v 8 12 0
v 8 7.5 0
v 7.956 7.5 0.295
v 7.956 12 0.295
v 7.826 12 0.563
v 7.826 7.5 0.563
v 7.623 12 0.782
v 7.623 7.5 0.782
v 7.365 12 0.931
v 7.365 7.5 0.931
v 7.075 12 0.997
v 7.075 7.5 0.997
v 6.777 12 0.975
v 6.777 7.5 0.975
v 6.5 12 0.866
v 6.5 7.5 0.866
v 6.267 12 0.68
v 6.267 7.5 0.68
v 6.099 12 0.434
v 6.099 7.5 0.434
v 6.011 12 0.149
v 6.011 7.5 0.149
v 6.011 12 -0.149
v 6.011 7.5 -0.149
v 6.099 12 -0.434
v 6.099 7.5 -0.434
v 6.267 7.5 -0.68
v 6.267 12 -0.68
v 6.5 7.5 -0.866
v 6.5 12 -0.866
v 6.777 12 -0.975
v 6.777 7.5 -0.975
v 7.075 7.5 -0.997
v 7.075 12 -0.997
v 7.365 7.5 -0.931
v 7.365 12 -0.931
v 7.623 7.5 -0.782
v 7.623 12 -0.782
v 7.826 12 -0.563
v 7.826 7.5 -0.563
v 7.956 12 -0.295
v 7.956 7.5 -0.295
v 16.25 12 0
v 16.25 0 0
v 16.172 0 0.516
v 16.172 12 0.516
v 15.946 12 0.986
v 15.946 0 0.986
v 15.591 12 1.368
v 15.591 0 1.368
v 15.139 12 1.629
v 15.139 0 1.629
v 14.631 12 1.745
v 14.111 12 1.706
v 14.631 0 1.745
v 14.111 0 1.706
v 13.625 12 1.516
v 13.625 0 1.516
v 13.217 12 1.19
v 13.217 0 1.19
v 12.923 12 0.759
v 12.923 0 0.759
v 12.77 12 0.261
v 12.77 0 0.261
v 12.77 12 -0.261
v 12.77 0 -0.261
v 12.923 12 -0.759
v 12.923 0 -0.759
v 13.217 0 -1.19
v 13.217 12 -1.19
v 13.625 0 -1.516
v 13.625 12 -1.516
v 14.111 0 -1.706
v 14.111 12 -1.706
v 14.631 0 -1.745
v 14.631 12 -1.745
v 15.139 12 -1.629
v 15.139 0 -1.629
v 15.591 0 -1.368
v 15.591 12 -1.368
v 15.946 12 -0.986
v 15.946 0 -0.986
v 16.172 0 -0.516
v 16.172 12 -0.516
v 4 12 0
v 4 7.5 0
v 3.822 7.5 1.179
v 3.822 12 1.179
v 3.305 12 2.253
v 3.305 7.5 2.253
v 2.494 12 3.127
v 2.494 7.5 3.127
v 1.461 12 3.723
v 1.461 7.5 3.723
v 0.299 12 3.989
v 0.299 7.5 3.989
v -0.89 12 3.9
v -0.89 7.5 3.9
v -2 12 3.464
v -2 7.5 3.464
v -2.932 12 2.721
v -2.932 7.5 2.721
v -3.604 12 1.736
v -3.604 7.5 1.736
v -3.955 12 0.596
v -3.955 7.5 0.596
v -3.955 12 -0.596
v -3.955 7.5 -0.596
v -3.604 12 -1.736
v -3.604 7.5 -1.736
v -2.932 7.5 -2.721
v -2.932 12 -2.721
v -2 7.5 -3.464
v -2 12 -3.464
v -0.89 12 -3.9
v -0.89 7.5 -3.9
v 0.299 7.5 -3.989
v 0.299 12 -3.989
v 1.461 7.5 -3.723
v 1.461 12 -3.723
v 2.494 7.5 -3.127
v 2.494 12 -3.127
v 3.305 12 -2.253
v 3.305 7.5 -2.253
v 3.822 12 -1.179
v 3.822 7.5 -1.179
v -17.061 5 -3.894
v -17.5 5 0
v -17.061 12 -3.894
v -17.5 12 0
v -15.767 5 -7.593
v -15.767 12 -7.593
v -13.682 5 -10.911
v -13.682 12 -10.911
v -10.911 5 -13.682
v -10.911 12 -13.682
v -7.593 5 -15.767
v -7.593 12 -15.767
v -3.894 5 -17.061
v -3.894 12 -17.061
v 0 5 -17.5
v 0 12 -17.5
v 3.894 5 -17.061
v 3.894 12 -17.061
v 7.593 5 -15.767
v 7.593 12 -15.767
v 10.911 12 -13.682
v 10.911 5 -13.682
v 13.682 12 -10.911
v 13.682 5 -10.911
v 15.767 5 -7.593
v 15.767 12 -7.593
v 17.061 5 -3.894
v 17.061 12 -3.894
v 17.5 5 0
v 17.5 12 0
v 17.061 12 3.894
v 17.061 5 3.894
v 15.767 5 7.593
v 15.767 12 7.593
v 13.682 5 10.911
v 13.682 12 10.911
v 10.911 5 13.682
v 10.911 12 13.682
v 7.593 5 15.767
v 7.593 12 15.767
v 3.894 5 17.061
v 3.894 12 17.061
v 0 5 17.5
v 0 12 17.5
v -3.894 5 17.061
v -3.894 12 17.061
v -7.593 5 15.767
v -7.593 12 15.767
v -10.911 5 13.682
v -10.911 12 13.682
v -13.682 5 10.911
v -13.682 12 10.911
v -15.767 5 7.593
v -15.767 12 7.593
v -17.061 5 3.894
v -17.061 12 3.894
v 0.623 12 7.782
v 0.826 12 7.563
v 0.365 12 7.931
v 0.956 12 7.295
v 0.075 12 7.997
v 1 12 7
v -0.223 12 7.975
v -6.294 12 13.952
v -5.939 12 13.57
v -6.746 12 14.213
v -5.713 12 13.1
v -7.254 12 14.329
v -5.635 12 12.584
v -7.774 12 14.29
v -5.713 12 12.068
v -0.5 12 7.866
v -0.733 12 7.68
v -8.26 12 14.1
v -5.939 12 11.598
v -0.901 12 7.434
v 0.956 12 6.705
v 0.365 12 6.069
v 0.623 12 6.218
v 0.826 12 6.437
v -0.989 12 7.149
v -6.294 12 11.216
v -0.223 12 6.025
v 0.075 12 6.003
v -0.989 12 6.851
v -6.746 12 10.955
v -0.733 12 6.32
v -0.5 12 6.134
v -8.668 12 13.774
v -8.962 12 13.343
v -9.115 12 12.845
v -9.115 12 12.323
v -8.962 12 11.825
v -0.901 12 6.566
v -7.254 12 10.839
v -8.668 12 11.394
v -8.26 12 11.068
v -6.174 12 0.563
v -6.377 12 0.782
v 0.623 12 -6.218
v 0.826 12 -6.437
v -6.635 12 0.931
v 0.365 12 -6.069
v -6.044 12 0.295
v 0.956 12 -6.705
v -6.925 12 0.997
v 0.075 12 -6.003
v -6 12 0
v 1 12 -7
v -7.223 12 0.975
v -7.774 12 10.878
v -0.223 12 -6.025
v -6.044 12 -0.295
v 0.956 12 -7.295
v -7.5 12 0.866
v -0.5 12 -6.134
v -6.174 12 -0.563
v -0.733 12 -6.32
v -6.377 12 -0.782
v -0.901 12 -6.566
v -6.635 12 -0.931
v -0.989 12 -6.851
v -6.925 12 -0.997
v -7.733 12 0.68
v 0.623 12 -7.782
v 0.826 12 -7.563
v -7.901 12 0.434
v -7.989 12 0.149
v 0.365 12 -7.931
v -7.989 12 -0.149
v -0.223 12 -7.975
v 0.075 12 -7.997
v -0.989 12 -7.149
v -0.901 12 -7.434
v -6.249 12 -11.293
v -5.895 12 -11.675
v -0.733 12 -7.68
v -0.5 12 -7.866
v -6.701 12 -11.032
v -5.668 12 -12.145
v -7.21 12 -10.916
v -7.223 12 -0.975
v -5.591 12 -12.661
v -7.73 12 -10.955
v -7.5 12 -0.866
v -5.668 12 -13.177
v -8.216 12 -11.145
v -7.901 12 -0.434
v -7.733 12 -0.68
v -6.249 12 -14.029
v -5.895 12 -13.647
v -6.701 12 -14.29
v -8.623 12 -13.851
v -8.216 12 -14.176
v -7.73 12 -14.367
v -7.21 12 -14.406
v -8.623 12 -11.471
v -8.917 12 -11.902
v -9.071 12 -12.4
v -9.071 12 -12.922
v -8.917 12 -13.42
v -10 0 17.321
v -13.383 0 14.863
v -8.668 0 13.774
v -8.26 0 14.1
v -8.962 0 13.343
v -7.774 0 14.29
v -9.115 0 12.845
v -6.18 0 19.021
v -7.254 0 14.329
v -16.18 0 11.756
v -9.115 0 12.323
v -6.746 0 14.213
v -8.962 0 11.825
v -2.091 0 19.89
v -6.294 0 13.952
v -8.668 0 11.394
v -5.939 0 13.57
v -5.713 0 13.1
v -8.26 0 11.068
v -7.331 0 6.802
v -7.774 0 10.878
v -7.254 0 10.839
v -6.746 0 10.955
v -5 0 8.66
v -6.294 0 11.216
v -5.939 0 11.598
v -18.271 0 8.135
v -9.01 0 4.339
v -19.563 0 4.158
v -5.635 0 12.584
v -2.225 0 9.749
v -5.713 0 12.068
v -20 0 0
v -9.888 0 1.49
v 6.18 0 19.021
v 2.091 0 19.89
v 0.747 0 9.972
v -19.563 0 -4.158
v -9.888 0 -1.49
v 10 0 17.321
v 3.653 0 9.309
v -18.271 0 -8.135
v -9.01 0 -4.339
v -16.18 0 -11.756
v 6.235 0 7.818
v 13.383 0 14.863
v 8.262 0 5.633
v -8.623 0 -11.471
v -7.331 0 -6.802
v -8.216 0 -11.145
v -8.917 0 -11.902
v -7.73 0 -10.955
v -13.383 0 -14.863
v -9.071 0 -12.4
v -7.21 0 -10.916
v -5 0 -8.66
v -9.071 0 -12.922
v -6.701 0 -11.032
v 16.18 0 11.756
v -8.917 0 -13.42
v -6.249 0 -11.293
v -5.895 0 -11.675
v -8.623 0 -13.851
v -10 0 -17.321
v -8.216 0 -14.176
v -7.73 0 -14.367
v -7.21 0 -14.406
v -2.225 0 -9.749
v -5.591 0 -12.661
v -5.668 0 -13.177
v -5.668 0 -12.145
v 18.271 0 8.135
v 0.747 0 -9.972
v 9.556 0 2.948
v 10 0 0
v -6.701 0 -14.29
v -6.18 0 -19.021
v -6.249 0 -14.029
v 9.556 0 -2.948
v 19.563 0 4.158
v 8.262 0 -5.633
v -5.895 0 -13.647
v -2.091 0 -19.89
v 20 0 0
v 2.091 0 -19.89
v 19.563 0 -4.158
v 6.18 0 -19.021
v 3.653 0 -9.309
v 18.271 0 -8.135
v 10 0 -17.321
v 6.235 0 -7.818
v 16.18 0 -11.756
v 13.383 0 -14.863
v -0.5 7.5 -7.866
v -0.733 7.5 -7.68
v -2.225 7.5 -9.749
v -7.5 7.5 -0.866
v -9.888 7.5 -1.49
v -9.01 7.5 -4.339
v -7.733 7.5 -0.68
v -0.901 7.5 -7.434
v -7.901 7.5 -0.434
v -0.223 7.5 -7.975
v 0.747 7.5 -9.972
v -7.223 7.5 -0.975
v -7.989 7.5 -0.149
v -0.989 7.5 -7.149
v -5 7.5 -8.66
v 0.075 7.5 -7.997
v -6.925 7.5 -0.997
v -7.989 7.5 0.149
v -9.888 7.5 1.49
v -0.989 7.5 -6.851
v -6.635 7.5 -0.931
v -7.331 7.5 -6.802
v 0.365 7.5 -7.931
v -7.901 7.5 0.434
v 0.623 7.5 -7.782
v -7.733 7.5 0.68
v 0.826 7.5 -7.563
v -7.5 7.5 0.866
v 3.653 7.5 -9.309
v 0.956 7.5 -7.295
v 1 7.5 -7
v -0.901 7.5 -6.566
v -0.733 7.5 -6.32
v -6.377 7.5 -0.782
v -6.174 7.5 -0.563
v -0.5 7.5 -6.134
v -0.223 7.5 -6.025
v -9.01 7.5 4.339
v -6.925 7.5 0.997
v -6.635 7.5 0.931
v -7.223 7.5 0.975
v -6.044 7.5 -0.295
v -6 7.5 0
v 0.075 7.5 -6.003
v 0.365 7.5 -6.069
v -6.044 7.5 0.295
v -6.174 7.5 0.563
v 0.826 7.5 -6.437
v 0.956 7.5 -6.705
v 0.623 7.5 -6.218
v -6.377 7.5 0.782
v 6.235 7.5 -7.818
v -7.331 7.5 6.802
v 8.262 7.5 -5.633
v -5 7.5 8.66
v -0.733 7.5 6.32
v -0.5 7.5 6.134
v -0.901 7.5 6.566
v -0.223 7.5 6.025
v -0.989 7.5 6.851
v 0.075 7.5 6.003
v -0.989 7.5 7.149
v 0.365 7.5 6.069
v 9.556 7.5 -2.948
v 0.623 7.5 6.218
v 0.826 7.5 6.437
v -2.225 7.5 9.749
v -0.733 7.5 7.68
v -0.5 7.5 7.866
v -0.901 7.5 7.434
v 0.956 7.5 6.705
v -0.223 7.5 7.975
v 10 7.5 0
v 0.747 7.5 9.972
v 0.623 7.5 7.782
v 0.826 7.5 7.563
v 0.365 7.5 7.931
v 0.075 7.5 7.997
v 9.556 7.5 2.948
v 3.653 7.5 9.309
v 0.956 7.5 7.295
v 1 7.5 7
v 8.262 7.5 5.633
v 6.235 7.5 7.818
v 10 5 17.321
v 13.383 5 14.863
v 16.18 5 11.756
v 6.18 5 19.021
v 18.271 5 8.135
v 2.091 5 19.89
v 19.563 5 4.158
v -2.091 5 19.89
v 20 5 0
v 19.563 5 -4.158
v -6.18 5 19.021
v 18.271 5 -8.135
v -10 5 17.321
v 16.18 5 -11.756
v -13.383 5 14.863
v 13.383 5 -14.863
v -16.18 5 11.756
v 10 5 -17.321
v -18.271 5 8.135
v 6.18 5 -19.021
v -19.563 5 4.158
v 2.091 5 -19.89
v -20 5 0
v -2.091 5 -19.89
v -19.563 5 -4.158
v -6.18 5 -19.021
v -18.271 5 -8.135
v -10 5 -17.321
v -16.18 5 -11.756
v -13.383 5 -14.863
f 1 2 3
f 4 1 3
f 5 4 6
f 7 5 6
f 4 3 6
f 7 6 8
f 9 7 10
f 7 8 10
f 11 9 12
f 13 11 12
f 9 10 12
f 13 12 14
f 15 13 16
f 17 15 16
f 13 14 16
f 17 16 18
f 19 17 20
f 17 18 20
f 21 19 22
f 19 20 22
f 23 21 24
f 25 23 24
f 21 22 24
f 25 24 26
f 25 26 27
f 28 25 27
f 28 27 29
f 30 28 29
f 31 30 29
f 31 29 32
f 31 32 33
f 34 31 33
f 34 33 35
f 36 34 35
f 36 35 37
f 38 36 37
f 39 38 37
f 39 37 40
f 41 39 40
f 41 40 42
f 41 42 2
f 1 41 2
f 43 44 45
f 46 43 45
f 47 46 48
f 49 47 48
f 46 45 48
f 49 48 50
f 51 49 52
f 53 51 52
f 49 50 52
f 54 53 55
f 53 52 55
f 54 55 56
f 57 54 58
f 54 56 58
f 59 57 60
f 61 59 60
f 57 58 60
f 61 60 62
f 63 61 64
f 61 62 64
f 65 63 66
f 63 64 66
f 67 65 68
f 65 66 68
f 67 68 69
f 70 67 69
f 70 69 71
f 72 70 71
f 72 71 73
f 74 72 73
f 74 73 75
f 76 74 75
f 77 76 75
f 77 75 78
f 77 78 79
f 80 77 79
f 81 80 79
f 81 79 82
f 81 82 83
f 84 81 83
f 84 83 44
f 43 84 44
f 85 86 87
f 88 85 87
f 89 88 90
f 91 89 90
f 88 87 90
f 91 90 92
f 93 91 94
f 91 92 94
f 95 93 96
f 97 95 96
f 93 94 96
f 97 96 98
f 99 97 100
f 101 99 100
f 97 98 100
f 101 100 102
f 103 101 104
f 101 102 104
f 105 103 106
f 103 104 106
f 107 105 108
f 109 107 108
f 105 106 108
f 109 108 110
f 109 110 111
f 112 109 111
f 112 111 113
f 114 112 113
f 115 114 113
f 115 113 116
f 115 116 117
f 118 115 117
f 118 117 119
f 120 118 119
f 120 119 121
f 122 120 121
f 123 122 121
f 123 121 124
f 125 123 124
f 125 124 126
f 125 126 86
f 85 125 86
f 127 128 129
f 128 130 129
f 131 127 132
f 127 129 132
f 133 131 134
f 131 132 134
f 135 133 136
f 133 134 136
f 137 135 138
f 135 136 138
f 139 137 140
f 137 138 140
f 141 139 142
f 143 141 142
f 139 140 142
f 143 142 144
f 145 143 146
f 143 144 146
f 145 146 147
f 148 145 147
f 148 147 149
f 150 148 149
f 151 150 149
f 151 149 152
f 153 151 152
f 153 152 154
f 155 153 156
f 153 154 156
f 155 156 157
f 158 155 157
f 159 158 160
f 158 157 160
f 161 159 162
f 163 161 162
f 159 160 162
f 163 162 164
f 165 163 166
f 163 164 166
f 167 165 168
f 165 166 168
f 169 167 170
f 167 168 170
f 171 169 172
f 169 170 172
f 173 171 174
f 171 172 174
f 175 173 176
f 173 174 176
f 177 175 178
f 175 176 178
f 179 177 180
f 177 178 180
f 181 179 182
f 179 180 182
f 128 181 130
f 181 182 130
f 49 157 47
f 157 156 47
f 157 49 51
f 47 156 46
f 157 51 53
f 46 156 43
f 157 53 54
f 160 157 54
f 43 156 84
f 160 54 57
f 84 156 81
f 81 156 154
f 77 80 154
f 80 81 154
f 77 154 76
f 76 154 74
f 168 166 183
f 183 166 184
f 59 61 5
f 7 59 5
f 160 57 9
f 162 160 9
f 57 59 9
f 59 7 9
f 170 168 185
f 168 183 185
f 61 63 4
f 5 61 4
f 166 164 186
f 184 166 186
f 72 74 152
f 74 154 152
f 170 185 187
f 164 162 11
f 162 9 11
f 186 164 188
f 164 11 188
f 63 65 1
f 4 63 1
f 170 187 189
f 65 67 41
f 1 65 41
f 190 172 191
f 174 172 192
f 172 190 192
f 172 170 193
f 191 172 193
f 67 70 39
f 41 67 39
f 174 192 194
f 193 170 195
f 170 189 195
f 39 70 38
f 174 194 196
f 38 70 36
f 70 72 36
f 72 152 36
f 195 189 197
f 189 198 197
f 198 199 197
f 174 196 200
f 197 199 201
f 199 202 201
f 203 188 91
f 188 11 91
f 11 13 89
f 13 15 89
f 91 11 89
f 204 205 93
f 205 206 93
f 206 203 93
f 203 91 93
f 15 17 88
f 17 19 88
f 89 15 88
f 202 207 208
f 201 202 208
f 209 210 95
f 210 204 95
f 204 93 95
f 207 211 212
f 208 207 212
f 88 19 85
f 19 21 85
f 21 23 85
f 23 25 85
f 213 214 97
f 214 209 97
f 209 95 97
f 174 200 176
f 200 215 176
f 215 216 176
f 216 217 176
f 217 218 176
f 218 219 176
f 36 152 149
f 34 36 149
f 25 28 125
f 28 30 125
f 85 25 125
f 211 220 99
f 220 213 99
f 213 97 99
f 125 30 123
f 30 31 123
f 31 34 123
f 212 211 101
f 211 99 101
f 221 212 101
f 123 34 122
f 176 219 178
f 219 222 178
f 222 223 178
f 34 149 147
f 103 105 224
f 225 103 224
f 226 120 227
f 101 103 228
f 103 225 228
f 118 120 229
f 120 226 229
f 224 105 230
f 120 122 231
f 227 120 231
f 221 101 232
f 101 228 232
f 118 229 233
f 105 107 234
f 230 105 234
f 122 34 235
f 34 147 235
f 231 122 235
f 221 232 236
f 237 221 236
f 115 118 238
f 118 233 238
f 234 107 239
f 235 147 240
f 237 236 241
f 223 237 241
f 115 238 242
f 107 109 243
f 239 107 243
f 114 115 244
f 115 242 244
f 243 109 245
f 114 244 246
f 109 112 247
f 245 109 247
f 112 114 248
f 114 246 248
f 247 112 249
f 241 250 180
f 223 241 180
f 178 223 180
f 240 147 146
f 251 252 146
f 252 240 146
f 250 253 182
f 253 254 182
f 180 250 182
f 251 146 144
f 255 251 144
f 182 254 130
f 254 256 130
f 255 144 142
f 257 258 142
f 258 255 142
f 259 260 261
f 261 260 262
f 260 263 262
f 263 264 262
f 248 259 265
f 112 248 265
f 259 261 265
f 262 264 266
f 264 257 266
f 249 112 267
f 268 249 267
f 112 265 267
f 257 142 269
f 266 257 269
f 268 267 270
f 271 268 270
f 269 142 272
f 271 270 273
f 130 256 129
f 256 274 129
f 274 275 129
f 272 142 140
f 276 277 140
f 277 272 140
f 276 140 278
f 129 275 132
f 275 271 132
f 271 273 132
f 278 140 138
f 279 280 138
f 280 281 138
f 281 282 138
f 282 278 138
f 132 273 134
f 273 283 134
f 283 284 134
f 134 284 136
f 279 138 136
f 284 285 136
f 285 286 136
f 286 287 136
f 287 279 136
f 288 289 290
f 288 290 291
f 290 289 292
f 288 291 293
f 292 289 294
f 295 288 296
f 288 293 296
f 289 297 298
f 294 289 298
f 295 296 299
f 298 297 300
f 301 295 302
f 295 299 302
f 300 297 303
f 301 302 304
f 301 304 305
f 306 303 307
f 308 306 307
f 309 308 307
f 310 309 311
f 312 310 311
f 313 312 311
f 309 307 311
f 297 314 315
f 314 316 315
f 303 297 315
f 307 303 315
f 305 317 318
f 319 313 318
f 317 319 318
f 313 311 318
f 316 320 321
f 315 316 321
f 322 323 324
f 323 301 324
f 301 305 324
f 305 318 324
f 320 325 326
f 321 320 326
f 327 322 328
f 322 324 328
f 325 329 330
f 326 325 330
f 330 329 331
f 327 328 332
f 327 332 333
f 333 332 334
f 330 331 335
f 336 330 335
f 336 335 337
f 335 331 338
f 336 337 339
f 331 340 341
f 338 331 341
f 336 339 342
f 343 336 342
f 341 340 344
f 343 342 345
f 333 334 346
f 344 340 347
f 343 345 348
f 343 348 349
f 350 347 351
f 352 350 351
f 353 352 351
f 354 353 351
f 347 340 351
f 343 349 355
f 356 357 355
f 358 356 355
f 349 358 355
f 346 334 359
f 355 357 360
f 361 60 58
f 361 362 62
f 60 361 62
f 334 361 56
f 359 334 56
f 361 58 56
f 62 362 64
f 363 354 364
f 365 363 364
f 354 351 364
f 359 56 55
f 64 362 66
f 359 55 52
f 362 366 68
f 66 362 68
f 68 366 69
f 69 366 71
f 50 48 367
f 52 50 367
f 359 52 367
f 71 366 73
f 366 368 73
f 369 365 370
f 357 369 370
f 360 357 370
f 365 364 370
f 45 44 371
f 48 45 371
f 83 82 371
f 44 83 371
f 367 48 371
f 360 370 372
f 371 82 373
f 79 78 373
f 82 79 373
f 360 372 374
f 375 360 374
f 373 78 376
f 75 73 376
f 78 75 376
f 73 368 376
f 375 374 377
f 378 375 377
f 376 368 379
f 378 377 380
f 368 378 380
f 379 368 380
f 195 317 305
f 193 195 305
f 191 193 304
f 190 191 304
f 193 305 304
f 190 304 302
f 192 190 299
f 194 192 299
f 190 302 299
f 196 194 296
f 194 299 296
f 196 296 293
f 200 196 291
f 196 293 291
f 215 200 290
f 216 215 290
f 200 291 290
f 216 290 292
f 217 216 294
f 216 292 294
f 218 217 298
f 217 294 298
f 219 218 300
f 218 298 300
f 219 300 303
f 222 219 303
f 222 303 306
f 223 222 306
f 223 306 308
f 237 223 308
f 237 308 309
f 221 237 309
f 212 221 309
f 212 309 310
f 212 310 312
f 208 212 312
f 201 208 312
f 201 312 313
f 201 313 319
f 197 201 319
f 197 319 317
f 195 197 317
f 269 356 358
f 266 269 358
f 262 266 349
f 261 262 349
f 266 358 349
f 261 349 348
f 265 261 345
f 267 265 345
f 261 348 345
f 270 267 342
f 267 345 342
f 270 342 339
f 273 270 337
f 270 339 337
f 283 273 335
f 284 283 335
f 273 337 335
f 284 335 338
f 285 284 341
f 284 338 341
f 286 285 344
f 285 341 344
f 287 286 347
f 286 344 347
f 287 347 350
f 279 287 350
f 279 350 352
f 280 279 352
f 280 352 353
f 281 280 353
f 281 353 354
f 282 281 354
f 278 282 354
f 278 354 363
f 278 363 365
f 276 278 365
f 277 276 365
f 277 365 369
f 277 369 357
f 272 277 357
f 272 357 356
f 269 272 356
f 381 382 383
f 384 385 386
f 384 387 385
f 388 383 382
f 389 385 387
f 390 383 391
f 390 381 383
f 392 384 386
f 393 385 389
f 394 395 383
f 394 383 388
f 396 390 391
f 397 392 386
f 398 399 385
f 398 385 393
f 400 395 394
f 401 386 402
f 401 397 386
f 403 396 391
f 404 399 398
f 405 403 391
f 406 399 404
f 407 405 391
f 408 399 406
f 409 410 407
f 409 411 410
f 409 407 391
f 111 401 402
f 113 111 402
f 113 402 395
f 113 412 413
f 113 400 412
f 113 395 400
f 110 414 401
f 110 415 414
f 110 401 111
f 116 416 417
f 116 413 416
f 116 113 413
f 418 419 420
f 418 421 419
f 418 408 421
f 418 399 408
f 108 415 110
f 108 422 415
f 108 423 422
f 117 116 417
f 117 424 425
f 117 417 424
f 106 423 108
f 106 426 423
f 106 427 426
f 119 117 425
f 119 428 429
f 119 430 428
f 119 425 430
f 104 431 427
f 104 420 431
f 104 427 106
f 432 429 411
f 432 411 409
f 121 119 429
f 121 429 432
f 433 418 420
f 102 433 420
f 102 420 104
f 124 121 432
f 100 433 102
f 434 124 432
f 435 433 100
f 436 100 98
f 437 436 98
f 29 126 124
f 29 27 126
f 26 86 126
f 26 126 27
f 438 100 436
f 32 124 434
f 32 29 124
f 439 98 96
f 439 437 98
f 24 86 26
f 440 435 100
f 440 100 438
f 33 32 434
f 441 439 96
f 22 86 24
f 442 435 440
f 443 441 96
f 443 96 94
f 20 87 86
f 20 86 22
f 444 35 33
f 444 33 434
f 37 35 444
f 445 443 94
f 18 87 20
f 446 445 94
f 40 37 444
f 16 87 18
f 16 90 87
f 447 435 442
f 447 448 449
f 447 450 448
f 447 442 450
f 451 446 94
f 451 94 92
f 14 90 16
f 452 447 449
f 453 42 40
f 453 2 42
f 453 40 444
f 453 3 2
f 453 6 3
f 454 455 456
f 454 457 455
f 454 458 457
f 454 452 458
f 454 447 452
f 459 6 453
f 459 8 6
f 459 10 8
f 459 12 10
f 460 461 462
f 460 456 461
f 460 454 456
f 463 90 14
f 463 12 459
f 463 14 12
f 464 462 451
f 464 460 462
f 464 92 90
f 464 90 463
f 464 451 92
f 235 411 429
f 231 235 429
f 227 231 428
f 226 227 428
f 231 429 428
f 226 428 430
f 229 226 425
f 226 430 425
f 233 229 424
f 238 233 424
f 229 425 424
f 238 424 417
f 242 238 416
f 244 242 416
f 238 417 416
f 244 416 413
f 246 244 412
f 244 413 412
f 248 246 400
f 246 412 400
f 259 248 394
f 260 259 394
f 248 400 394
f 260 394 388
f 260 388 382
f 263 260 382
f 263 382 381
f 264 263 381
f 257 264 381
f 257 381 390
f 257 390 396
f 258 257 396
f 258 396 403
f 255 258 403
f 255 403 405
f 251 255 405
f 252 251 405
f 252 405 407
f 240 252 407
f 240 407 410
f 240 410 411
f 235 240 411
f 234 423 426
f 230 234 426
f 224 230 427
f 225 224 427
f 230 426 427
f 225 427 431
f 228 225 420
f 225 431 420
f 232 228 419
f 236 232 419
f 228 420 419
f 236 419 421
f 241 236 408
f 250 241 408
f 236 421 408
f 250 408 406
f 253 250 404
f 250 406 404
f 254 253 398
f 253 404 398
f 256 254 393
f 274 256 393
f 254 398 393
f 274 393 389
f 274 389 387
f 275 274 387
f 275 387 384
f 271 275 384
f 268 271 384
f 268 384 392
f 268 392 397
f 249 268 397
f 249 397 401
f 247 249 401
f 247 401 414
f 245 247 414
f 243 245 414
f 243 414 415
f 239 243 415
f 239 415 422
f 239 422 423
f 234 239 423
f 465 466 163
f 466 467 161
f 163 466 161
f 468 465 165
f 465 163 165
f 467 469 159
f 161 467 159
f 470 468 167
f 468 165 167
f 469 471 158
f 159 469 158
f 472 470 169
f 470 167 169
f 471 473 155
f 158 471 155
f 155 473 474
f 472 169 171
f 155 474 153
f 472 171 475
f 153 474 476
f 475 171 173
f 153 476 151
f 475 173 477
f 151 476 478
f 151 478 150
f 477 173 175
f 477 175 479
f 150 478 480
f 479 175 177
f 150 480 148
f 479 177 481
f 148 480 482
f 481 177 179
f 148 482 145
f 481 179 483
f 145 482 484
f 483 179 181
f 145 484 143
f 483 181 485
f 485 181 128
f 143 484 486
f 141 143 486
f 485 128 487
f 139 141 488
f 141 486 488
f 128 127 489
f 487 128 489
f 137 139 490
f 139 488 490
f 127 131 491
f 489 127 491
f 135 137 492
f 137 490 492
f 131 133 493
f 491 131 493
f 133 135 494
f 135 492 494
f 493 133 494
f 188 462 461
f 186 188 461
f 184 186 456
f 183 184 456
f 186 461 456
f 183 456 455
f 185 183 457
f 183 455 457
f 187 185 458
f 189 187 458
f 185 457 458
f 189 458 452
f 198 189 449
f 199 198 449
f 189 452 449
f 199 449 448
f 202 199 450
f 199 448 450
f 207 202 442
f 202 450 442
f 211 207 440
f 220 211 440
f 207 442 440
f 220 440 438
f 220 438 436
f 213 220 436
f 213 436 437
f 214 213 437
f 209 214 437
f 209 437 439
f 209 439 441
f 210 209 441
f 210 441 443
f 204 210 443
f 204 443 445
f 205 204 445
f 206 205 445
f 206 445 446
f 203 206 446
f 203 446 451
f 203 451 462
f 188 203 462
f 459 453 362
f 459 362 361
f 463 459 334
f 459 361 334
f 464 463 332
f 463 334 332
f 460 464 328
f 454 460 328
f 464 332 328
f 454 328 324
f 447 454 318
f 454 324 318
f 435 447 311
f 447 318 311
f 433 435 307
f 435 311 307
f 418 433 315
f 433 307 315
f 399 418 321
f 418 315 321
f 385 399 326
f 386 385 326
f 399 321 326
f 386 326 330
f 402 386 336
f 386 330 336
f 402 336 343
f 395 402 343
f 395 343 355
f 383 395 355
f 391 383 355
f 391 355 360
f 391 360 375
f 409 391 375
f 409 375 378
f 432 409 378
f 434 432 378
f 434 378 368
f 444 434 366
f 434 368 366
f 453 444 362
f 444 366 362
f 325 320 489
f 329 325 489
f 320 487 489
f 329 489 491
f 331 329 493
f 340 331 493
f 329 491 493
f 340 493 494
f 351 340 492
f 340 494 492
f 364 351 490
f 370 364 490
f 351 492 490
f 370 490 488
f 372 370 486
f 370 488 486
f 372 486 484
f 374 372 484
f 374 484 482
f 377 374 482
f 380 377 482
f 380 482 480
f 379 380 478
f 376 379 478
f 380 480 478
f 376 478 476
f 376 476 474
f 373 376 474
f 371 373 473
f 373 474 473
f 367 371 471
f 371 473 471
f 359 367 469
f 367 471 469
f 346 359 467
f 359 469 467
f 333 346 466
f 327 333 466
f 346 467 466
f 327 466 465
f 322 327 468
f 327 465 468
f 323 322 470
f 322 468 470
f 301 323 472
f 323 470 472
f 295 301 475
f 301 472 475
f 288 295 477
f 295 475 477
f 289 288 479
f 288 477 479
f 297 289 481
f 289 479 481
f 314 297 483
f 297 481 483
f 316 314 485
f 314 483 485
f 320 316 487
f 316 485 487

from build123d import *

# Parameters (mm, degrees)
SKETCH2_R          = 1.75
SKETCH2_R_2        = 4
SKETCH2_R_3        = 1
CUT_EXTRUDE5_DEPTH = 31.724582991
SKETCH2_7_R        = 10
CUT_EXTRUDE6_DEPTH = 7.5


with BuildPart() as part:
    # Sketch1 → Revolve2 (revolve)
    with BuildSketch(Plane.XY):
        Polygon((-20, 0), (0, 0), (0, 12), (-17.5, 12), (-17.5, 5), (-20, 5), align=None)
    revolve(axis=Axis((0, 12, 0), (0, -1, 0)))

    # Sketch2 → Cut-Extrude5 (cut, through all)
    with BuildSketch(Plane.XZ):
        with Locations((14.5, 0)):
            Circle(SKETCH2_R)
        with Locations((-7.340557342, -12.660927377)):
            Circle(SKETCH2_R)
        with Locations((-7.384963415, 12.584013803)):
            Circle(SKETCH2_R)
        Circle(SKETCH2_R_2)
        with Locations((7, 0)):
            Circle(SKETCH2_R_3)
        with Locations((0, -7)):
            Circle(SKETCH2_R_3)
        with Locations((-7, 0)):
            Circle(SKETCH2_R_3)
        with Locations((0, 7)):
            Circle(SKETCH2_R_3)
    extrude(amount=-CUT_EXTRUDE5_DEPTH, mode=Mode.SUBTRACT)

    # Sketch2<7> → Cut-Extrude6 (cut)
    with BuildSketch(Plane.XZ):
        Circle(SKETCH2_7_R)
    extrude(amount=-CUT_EXTRUDE6_DEPTH, mode=Mode.SUBTRACT)


solid = part.part
